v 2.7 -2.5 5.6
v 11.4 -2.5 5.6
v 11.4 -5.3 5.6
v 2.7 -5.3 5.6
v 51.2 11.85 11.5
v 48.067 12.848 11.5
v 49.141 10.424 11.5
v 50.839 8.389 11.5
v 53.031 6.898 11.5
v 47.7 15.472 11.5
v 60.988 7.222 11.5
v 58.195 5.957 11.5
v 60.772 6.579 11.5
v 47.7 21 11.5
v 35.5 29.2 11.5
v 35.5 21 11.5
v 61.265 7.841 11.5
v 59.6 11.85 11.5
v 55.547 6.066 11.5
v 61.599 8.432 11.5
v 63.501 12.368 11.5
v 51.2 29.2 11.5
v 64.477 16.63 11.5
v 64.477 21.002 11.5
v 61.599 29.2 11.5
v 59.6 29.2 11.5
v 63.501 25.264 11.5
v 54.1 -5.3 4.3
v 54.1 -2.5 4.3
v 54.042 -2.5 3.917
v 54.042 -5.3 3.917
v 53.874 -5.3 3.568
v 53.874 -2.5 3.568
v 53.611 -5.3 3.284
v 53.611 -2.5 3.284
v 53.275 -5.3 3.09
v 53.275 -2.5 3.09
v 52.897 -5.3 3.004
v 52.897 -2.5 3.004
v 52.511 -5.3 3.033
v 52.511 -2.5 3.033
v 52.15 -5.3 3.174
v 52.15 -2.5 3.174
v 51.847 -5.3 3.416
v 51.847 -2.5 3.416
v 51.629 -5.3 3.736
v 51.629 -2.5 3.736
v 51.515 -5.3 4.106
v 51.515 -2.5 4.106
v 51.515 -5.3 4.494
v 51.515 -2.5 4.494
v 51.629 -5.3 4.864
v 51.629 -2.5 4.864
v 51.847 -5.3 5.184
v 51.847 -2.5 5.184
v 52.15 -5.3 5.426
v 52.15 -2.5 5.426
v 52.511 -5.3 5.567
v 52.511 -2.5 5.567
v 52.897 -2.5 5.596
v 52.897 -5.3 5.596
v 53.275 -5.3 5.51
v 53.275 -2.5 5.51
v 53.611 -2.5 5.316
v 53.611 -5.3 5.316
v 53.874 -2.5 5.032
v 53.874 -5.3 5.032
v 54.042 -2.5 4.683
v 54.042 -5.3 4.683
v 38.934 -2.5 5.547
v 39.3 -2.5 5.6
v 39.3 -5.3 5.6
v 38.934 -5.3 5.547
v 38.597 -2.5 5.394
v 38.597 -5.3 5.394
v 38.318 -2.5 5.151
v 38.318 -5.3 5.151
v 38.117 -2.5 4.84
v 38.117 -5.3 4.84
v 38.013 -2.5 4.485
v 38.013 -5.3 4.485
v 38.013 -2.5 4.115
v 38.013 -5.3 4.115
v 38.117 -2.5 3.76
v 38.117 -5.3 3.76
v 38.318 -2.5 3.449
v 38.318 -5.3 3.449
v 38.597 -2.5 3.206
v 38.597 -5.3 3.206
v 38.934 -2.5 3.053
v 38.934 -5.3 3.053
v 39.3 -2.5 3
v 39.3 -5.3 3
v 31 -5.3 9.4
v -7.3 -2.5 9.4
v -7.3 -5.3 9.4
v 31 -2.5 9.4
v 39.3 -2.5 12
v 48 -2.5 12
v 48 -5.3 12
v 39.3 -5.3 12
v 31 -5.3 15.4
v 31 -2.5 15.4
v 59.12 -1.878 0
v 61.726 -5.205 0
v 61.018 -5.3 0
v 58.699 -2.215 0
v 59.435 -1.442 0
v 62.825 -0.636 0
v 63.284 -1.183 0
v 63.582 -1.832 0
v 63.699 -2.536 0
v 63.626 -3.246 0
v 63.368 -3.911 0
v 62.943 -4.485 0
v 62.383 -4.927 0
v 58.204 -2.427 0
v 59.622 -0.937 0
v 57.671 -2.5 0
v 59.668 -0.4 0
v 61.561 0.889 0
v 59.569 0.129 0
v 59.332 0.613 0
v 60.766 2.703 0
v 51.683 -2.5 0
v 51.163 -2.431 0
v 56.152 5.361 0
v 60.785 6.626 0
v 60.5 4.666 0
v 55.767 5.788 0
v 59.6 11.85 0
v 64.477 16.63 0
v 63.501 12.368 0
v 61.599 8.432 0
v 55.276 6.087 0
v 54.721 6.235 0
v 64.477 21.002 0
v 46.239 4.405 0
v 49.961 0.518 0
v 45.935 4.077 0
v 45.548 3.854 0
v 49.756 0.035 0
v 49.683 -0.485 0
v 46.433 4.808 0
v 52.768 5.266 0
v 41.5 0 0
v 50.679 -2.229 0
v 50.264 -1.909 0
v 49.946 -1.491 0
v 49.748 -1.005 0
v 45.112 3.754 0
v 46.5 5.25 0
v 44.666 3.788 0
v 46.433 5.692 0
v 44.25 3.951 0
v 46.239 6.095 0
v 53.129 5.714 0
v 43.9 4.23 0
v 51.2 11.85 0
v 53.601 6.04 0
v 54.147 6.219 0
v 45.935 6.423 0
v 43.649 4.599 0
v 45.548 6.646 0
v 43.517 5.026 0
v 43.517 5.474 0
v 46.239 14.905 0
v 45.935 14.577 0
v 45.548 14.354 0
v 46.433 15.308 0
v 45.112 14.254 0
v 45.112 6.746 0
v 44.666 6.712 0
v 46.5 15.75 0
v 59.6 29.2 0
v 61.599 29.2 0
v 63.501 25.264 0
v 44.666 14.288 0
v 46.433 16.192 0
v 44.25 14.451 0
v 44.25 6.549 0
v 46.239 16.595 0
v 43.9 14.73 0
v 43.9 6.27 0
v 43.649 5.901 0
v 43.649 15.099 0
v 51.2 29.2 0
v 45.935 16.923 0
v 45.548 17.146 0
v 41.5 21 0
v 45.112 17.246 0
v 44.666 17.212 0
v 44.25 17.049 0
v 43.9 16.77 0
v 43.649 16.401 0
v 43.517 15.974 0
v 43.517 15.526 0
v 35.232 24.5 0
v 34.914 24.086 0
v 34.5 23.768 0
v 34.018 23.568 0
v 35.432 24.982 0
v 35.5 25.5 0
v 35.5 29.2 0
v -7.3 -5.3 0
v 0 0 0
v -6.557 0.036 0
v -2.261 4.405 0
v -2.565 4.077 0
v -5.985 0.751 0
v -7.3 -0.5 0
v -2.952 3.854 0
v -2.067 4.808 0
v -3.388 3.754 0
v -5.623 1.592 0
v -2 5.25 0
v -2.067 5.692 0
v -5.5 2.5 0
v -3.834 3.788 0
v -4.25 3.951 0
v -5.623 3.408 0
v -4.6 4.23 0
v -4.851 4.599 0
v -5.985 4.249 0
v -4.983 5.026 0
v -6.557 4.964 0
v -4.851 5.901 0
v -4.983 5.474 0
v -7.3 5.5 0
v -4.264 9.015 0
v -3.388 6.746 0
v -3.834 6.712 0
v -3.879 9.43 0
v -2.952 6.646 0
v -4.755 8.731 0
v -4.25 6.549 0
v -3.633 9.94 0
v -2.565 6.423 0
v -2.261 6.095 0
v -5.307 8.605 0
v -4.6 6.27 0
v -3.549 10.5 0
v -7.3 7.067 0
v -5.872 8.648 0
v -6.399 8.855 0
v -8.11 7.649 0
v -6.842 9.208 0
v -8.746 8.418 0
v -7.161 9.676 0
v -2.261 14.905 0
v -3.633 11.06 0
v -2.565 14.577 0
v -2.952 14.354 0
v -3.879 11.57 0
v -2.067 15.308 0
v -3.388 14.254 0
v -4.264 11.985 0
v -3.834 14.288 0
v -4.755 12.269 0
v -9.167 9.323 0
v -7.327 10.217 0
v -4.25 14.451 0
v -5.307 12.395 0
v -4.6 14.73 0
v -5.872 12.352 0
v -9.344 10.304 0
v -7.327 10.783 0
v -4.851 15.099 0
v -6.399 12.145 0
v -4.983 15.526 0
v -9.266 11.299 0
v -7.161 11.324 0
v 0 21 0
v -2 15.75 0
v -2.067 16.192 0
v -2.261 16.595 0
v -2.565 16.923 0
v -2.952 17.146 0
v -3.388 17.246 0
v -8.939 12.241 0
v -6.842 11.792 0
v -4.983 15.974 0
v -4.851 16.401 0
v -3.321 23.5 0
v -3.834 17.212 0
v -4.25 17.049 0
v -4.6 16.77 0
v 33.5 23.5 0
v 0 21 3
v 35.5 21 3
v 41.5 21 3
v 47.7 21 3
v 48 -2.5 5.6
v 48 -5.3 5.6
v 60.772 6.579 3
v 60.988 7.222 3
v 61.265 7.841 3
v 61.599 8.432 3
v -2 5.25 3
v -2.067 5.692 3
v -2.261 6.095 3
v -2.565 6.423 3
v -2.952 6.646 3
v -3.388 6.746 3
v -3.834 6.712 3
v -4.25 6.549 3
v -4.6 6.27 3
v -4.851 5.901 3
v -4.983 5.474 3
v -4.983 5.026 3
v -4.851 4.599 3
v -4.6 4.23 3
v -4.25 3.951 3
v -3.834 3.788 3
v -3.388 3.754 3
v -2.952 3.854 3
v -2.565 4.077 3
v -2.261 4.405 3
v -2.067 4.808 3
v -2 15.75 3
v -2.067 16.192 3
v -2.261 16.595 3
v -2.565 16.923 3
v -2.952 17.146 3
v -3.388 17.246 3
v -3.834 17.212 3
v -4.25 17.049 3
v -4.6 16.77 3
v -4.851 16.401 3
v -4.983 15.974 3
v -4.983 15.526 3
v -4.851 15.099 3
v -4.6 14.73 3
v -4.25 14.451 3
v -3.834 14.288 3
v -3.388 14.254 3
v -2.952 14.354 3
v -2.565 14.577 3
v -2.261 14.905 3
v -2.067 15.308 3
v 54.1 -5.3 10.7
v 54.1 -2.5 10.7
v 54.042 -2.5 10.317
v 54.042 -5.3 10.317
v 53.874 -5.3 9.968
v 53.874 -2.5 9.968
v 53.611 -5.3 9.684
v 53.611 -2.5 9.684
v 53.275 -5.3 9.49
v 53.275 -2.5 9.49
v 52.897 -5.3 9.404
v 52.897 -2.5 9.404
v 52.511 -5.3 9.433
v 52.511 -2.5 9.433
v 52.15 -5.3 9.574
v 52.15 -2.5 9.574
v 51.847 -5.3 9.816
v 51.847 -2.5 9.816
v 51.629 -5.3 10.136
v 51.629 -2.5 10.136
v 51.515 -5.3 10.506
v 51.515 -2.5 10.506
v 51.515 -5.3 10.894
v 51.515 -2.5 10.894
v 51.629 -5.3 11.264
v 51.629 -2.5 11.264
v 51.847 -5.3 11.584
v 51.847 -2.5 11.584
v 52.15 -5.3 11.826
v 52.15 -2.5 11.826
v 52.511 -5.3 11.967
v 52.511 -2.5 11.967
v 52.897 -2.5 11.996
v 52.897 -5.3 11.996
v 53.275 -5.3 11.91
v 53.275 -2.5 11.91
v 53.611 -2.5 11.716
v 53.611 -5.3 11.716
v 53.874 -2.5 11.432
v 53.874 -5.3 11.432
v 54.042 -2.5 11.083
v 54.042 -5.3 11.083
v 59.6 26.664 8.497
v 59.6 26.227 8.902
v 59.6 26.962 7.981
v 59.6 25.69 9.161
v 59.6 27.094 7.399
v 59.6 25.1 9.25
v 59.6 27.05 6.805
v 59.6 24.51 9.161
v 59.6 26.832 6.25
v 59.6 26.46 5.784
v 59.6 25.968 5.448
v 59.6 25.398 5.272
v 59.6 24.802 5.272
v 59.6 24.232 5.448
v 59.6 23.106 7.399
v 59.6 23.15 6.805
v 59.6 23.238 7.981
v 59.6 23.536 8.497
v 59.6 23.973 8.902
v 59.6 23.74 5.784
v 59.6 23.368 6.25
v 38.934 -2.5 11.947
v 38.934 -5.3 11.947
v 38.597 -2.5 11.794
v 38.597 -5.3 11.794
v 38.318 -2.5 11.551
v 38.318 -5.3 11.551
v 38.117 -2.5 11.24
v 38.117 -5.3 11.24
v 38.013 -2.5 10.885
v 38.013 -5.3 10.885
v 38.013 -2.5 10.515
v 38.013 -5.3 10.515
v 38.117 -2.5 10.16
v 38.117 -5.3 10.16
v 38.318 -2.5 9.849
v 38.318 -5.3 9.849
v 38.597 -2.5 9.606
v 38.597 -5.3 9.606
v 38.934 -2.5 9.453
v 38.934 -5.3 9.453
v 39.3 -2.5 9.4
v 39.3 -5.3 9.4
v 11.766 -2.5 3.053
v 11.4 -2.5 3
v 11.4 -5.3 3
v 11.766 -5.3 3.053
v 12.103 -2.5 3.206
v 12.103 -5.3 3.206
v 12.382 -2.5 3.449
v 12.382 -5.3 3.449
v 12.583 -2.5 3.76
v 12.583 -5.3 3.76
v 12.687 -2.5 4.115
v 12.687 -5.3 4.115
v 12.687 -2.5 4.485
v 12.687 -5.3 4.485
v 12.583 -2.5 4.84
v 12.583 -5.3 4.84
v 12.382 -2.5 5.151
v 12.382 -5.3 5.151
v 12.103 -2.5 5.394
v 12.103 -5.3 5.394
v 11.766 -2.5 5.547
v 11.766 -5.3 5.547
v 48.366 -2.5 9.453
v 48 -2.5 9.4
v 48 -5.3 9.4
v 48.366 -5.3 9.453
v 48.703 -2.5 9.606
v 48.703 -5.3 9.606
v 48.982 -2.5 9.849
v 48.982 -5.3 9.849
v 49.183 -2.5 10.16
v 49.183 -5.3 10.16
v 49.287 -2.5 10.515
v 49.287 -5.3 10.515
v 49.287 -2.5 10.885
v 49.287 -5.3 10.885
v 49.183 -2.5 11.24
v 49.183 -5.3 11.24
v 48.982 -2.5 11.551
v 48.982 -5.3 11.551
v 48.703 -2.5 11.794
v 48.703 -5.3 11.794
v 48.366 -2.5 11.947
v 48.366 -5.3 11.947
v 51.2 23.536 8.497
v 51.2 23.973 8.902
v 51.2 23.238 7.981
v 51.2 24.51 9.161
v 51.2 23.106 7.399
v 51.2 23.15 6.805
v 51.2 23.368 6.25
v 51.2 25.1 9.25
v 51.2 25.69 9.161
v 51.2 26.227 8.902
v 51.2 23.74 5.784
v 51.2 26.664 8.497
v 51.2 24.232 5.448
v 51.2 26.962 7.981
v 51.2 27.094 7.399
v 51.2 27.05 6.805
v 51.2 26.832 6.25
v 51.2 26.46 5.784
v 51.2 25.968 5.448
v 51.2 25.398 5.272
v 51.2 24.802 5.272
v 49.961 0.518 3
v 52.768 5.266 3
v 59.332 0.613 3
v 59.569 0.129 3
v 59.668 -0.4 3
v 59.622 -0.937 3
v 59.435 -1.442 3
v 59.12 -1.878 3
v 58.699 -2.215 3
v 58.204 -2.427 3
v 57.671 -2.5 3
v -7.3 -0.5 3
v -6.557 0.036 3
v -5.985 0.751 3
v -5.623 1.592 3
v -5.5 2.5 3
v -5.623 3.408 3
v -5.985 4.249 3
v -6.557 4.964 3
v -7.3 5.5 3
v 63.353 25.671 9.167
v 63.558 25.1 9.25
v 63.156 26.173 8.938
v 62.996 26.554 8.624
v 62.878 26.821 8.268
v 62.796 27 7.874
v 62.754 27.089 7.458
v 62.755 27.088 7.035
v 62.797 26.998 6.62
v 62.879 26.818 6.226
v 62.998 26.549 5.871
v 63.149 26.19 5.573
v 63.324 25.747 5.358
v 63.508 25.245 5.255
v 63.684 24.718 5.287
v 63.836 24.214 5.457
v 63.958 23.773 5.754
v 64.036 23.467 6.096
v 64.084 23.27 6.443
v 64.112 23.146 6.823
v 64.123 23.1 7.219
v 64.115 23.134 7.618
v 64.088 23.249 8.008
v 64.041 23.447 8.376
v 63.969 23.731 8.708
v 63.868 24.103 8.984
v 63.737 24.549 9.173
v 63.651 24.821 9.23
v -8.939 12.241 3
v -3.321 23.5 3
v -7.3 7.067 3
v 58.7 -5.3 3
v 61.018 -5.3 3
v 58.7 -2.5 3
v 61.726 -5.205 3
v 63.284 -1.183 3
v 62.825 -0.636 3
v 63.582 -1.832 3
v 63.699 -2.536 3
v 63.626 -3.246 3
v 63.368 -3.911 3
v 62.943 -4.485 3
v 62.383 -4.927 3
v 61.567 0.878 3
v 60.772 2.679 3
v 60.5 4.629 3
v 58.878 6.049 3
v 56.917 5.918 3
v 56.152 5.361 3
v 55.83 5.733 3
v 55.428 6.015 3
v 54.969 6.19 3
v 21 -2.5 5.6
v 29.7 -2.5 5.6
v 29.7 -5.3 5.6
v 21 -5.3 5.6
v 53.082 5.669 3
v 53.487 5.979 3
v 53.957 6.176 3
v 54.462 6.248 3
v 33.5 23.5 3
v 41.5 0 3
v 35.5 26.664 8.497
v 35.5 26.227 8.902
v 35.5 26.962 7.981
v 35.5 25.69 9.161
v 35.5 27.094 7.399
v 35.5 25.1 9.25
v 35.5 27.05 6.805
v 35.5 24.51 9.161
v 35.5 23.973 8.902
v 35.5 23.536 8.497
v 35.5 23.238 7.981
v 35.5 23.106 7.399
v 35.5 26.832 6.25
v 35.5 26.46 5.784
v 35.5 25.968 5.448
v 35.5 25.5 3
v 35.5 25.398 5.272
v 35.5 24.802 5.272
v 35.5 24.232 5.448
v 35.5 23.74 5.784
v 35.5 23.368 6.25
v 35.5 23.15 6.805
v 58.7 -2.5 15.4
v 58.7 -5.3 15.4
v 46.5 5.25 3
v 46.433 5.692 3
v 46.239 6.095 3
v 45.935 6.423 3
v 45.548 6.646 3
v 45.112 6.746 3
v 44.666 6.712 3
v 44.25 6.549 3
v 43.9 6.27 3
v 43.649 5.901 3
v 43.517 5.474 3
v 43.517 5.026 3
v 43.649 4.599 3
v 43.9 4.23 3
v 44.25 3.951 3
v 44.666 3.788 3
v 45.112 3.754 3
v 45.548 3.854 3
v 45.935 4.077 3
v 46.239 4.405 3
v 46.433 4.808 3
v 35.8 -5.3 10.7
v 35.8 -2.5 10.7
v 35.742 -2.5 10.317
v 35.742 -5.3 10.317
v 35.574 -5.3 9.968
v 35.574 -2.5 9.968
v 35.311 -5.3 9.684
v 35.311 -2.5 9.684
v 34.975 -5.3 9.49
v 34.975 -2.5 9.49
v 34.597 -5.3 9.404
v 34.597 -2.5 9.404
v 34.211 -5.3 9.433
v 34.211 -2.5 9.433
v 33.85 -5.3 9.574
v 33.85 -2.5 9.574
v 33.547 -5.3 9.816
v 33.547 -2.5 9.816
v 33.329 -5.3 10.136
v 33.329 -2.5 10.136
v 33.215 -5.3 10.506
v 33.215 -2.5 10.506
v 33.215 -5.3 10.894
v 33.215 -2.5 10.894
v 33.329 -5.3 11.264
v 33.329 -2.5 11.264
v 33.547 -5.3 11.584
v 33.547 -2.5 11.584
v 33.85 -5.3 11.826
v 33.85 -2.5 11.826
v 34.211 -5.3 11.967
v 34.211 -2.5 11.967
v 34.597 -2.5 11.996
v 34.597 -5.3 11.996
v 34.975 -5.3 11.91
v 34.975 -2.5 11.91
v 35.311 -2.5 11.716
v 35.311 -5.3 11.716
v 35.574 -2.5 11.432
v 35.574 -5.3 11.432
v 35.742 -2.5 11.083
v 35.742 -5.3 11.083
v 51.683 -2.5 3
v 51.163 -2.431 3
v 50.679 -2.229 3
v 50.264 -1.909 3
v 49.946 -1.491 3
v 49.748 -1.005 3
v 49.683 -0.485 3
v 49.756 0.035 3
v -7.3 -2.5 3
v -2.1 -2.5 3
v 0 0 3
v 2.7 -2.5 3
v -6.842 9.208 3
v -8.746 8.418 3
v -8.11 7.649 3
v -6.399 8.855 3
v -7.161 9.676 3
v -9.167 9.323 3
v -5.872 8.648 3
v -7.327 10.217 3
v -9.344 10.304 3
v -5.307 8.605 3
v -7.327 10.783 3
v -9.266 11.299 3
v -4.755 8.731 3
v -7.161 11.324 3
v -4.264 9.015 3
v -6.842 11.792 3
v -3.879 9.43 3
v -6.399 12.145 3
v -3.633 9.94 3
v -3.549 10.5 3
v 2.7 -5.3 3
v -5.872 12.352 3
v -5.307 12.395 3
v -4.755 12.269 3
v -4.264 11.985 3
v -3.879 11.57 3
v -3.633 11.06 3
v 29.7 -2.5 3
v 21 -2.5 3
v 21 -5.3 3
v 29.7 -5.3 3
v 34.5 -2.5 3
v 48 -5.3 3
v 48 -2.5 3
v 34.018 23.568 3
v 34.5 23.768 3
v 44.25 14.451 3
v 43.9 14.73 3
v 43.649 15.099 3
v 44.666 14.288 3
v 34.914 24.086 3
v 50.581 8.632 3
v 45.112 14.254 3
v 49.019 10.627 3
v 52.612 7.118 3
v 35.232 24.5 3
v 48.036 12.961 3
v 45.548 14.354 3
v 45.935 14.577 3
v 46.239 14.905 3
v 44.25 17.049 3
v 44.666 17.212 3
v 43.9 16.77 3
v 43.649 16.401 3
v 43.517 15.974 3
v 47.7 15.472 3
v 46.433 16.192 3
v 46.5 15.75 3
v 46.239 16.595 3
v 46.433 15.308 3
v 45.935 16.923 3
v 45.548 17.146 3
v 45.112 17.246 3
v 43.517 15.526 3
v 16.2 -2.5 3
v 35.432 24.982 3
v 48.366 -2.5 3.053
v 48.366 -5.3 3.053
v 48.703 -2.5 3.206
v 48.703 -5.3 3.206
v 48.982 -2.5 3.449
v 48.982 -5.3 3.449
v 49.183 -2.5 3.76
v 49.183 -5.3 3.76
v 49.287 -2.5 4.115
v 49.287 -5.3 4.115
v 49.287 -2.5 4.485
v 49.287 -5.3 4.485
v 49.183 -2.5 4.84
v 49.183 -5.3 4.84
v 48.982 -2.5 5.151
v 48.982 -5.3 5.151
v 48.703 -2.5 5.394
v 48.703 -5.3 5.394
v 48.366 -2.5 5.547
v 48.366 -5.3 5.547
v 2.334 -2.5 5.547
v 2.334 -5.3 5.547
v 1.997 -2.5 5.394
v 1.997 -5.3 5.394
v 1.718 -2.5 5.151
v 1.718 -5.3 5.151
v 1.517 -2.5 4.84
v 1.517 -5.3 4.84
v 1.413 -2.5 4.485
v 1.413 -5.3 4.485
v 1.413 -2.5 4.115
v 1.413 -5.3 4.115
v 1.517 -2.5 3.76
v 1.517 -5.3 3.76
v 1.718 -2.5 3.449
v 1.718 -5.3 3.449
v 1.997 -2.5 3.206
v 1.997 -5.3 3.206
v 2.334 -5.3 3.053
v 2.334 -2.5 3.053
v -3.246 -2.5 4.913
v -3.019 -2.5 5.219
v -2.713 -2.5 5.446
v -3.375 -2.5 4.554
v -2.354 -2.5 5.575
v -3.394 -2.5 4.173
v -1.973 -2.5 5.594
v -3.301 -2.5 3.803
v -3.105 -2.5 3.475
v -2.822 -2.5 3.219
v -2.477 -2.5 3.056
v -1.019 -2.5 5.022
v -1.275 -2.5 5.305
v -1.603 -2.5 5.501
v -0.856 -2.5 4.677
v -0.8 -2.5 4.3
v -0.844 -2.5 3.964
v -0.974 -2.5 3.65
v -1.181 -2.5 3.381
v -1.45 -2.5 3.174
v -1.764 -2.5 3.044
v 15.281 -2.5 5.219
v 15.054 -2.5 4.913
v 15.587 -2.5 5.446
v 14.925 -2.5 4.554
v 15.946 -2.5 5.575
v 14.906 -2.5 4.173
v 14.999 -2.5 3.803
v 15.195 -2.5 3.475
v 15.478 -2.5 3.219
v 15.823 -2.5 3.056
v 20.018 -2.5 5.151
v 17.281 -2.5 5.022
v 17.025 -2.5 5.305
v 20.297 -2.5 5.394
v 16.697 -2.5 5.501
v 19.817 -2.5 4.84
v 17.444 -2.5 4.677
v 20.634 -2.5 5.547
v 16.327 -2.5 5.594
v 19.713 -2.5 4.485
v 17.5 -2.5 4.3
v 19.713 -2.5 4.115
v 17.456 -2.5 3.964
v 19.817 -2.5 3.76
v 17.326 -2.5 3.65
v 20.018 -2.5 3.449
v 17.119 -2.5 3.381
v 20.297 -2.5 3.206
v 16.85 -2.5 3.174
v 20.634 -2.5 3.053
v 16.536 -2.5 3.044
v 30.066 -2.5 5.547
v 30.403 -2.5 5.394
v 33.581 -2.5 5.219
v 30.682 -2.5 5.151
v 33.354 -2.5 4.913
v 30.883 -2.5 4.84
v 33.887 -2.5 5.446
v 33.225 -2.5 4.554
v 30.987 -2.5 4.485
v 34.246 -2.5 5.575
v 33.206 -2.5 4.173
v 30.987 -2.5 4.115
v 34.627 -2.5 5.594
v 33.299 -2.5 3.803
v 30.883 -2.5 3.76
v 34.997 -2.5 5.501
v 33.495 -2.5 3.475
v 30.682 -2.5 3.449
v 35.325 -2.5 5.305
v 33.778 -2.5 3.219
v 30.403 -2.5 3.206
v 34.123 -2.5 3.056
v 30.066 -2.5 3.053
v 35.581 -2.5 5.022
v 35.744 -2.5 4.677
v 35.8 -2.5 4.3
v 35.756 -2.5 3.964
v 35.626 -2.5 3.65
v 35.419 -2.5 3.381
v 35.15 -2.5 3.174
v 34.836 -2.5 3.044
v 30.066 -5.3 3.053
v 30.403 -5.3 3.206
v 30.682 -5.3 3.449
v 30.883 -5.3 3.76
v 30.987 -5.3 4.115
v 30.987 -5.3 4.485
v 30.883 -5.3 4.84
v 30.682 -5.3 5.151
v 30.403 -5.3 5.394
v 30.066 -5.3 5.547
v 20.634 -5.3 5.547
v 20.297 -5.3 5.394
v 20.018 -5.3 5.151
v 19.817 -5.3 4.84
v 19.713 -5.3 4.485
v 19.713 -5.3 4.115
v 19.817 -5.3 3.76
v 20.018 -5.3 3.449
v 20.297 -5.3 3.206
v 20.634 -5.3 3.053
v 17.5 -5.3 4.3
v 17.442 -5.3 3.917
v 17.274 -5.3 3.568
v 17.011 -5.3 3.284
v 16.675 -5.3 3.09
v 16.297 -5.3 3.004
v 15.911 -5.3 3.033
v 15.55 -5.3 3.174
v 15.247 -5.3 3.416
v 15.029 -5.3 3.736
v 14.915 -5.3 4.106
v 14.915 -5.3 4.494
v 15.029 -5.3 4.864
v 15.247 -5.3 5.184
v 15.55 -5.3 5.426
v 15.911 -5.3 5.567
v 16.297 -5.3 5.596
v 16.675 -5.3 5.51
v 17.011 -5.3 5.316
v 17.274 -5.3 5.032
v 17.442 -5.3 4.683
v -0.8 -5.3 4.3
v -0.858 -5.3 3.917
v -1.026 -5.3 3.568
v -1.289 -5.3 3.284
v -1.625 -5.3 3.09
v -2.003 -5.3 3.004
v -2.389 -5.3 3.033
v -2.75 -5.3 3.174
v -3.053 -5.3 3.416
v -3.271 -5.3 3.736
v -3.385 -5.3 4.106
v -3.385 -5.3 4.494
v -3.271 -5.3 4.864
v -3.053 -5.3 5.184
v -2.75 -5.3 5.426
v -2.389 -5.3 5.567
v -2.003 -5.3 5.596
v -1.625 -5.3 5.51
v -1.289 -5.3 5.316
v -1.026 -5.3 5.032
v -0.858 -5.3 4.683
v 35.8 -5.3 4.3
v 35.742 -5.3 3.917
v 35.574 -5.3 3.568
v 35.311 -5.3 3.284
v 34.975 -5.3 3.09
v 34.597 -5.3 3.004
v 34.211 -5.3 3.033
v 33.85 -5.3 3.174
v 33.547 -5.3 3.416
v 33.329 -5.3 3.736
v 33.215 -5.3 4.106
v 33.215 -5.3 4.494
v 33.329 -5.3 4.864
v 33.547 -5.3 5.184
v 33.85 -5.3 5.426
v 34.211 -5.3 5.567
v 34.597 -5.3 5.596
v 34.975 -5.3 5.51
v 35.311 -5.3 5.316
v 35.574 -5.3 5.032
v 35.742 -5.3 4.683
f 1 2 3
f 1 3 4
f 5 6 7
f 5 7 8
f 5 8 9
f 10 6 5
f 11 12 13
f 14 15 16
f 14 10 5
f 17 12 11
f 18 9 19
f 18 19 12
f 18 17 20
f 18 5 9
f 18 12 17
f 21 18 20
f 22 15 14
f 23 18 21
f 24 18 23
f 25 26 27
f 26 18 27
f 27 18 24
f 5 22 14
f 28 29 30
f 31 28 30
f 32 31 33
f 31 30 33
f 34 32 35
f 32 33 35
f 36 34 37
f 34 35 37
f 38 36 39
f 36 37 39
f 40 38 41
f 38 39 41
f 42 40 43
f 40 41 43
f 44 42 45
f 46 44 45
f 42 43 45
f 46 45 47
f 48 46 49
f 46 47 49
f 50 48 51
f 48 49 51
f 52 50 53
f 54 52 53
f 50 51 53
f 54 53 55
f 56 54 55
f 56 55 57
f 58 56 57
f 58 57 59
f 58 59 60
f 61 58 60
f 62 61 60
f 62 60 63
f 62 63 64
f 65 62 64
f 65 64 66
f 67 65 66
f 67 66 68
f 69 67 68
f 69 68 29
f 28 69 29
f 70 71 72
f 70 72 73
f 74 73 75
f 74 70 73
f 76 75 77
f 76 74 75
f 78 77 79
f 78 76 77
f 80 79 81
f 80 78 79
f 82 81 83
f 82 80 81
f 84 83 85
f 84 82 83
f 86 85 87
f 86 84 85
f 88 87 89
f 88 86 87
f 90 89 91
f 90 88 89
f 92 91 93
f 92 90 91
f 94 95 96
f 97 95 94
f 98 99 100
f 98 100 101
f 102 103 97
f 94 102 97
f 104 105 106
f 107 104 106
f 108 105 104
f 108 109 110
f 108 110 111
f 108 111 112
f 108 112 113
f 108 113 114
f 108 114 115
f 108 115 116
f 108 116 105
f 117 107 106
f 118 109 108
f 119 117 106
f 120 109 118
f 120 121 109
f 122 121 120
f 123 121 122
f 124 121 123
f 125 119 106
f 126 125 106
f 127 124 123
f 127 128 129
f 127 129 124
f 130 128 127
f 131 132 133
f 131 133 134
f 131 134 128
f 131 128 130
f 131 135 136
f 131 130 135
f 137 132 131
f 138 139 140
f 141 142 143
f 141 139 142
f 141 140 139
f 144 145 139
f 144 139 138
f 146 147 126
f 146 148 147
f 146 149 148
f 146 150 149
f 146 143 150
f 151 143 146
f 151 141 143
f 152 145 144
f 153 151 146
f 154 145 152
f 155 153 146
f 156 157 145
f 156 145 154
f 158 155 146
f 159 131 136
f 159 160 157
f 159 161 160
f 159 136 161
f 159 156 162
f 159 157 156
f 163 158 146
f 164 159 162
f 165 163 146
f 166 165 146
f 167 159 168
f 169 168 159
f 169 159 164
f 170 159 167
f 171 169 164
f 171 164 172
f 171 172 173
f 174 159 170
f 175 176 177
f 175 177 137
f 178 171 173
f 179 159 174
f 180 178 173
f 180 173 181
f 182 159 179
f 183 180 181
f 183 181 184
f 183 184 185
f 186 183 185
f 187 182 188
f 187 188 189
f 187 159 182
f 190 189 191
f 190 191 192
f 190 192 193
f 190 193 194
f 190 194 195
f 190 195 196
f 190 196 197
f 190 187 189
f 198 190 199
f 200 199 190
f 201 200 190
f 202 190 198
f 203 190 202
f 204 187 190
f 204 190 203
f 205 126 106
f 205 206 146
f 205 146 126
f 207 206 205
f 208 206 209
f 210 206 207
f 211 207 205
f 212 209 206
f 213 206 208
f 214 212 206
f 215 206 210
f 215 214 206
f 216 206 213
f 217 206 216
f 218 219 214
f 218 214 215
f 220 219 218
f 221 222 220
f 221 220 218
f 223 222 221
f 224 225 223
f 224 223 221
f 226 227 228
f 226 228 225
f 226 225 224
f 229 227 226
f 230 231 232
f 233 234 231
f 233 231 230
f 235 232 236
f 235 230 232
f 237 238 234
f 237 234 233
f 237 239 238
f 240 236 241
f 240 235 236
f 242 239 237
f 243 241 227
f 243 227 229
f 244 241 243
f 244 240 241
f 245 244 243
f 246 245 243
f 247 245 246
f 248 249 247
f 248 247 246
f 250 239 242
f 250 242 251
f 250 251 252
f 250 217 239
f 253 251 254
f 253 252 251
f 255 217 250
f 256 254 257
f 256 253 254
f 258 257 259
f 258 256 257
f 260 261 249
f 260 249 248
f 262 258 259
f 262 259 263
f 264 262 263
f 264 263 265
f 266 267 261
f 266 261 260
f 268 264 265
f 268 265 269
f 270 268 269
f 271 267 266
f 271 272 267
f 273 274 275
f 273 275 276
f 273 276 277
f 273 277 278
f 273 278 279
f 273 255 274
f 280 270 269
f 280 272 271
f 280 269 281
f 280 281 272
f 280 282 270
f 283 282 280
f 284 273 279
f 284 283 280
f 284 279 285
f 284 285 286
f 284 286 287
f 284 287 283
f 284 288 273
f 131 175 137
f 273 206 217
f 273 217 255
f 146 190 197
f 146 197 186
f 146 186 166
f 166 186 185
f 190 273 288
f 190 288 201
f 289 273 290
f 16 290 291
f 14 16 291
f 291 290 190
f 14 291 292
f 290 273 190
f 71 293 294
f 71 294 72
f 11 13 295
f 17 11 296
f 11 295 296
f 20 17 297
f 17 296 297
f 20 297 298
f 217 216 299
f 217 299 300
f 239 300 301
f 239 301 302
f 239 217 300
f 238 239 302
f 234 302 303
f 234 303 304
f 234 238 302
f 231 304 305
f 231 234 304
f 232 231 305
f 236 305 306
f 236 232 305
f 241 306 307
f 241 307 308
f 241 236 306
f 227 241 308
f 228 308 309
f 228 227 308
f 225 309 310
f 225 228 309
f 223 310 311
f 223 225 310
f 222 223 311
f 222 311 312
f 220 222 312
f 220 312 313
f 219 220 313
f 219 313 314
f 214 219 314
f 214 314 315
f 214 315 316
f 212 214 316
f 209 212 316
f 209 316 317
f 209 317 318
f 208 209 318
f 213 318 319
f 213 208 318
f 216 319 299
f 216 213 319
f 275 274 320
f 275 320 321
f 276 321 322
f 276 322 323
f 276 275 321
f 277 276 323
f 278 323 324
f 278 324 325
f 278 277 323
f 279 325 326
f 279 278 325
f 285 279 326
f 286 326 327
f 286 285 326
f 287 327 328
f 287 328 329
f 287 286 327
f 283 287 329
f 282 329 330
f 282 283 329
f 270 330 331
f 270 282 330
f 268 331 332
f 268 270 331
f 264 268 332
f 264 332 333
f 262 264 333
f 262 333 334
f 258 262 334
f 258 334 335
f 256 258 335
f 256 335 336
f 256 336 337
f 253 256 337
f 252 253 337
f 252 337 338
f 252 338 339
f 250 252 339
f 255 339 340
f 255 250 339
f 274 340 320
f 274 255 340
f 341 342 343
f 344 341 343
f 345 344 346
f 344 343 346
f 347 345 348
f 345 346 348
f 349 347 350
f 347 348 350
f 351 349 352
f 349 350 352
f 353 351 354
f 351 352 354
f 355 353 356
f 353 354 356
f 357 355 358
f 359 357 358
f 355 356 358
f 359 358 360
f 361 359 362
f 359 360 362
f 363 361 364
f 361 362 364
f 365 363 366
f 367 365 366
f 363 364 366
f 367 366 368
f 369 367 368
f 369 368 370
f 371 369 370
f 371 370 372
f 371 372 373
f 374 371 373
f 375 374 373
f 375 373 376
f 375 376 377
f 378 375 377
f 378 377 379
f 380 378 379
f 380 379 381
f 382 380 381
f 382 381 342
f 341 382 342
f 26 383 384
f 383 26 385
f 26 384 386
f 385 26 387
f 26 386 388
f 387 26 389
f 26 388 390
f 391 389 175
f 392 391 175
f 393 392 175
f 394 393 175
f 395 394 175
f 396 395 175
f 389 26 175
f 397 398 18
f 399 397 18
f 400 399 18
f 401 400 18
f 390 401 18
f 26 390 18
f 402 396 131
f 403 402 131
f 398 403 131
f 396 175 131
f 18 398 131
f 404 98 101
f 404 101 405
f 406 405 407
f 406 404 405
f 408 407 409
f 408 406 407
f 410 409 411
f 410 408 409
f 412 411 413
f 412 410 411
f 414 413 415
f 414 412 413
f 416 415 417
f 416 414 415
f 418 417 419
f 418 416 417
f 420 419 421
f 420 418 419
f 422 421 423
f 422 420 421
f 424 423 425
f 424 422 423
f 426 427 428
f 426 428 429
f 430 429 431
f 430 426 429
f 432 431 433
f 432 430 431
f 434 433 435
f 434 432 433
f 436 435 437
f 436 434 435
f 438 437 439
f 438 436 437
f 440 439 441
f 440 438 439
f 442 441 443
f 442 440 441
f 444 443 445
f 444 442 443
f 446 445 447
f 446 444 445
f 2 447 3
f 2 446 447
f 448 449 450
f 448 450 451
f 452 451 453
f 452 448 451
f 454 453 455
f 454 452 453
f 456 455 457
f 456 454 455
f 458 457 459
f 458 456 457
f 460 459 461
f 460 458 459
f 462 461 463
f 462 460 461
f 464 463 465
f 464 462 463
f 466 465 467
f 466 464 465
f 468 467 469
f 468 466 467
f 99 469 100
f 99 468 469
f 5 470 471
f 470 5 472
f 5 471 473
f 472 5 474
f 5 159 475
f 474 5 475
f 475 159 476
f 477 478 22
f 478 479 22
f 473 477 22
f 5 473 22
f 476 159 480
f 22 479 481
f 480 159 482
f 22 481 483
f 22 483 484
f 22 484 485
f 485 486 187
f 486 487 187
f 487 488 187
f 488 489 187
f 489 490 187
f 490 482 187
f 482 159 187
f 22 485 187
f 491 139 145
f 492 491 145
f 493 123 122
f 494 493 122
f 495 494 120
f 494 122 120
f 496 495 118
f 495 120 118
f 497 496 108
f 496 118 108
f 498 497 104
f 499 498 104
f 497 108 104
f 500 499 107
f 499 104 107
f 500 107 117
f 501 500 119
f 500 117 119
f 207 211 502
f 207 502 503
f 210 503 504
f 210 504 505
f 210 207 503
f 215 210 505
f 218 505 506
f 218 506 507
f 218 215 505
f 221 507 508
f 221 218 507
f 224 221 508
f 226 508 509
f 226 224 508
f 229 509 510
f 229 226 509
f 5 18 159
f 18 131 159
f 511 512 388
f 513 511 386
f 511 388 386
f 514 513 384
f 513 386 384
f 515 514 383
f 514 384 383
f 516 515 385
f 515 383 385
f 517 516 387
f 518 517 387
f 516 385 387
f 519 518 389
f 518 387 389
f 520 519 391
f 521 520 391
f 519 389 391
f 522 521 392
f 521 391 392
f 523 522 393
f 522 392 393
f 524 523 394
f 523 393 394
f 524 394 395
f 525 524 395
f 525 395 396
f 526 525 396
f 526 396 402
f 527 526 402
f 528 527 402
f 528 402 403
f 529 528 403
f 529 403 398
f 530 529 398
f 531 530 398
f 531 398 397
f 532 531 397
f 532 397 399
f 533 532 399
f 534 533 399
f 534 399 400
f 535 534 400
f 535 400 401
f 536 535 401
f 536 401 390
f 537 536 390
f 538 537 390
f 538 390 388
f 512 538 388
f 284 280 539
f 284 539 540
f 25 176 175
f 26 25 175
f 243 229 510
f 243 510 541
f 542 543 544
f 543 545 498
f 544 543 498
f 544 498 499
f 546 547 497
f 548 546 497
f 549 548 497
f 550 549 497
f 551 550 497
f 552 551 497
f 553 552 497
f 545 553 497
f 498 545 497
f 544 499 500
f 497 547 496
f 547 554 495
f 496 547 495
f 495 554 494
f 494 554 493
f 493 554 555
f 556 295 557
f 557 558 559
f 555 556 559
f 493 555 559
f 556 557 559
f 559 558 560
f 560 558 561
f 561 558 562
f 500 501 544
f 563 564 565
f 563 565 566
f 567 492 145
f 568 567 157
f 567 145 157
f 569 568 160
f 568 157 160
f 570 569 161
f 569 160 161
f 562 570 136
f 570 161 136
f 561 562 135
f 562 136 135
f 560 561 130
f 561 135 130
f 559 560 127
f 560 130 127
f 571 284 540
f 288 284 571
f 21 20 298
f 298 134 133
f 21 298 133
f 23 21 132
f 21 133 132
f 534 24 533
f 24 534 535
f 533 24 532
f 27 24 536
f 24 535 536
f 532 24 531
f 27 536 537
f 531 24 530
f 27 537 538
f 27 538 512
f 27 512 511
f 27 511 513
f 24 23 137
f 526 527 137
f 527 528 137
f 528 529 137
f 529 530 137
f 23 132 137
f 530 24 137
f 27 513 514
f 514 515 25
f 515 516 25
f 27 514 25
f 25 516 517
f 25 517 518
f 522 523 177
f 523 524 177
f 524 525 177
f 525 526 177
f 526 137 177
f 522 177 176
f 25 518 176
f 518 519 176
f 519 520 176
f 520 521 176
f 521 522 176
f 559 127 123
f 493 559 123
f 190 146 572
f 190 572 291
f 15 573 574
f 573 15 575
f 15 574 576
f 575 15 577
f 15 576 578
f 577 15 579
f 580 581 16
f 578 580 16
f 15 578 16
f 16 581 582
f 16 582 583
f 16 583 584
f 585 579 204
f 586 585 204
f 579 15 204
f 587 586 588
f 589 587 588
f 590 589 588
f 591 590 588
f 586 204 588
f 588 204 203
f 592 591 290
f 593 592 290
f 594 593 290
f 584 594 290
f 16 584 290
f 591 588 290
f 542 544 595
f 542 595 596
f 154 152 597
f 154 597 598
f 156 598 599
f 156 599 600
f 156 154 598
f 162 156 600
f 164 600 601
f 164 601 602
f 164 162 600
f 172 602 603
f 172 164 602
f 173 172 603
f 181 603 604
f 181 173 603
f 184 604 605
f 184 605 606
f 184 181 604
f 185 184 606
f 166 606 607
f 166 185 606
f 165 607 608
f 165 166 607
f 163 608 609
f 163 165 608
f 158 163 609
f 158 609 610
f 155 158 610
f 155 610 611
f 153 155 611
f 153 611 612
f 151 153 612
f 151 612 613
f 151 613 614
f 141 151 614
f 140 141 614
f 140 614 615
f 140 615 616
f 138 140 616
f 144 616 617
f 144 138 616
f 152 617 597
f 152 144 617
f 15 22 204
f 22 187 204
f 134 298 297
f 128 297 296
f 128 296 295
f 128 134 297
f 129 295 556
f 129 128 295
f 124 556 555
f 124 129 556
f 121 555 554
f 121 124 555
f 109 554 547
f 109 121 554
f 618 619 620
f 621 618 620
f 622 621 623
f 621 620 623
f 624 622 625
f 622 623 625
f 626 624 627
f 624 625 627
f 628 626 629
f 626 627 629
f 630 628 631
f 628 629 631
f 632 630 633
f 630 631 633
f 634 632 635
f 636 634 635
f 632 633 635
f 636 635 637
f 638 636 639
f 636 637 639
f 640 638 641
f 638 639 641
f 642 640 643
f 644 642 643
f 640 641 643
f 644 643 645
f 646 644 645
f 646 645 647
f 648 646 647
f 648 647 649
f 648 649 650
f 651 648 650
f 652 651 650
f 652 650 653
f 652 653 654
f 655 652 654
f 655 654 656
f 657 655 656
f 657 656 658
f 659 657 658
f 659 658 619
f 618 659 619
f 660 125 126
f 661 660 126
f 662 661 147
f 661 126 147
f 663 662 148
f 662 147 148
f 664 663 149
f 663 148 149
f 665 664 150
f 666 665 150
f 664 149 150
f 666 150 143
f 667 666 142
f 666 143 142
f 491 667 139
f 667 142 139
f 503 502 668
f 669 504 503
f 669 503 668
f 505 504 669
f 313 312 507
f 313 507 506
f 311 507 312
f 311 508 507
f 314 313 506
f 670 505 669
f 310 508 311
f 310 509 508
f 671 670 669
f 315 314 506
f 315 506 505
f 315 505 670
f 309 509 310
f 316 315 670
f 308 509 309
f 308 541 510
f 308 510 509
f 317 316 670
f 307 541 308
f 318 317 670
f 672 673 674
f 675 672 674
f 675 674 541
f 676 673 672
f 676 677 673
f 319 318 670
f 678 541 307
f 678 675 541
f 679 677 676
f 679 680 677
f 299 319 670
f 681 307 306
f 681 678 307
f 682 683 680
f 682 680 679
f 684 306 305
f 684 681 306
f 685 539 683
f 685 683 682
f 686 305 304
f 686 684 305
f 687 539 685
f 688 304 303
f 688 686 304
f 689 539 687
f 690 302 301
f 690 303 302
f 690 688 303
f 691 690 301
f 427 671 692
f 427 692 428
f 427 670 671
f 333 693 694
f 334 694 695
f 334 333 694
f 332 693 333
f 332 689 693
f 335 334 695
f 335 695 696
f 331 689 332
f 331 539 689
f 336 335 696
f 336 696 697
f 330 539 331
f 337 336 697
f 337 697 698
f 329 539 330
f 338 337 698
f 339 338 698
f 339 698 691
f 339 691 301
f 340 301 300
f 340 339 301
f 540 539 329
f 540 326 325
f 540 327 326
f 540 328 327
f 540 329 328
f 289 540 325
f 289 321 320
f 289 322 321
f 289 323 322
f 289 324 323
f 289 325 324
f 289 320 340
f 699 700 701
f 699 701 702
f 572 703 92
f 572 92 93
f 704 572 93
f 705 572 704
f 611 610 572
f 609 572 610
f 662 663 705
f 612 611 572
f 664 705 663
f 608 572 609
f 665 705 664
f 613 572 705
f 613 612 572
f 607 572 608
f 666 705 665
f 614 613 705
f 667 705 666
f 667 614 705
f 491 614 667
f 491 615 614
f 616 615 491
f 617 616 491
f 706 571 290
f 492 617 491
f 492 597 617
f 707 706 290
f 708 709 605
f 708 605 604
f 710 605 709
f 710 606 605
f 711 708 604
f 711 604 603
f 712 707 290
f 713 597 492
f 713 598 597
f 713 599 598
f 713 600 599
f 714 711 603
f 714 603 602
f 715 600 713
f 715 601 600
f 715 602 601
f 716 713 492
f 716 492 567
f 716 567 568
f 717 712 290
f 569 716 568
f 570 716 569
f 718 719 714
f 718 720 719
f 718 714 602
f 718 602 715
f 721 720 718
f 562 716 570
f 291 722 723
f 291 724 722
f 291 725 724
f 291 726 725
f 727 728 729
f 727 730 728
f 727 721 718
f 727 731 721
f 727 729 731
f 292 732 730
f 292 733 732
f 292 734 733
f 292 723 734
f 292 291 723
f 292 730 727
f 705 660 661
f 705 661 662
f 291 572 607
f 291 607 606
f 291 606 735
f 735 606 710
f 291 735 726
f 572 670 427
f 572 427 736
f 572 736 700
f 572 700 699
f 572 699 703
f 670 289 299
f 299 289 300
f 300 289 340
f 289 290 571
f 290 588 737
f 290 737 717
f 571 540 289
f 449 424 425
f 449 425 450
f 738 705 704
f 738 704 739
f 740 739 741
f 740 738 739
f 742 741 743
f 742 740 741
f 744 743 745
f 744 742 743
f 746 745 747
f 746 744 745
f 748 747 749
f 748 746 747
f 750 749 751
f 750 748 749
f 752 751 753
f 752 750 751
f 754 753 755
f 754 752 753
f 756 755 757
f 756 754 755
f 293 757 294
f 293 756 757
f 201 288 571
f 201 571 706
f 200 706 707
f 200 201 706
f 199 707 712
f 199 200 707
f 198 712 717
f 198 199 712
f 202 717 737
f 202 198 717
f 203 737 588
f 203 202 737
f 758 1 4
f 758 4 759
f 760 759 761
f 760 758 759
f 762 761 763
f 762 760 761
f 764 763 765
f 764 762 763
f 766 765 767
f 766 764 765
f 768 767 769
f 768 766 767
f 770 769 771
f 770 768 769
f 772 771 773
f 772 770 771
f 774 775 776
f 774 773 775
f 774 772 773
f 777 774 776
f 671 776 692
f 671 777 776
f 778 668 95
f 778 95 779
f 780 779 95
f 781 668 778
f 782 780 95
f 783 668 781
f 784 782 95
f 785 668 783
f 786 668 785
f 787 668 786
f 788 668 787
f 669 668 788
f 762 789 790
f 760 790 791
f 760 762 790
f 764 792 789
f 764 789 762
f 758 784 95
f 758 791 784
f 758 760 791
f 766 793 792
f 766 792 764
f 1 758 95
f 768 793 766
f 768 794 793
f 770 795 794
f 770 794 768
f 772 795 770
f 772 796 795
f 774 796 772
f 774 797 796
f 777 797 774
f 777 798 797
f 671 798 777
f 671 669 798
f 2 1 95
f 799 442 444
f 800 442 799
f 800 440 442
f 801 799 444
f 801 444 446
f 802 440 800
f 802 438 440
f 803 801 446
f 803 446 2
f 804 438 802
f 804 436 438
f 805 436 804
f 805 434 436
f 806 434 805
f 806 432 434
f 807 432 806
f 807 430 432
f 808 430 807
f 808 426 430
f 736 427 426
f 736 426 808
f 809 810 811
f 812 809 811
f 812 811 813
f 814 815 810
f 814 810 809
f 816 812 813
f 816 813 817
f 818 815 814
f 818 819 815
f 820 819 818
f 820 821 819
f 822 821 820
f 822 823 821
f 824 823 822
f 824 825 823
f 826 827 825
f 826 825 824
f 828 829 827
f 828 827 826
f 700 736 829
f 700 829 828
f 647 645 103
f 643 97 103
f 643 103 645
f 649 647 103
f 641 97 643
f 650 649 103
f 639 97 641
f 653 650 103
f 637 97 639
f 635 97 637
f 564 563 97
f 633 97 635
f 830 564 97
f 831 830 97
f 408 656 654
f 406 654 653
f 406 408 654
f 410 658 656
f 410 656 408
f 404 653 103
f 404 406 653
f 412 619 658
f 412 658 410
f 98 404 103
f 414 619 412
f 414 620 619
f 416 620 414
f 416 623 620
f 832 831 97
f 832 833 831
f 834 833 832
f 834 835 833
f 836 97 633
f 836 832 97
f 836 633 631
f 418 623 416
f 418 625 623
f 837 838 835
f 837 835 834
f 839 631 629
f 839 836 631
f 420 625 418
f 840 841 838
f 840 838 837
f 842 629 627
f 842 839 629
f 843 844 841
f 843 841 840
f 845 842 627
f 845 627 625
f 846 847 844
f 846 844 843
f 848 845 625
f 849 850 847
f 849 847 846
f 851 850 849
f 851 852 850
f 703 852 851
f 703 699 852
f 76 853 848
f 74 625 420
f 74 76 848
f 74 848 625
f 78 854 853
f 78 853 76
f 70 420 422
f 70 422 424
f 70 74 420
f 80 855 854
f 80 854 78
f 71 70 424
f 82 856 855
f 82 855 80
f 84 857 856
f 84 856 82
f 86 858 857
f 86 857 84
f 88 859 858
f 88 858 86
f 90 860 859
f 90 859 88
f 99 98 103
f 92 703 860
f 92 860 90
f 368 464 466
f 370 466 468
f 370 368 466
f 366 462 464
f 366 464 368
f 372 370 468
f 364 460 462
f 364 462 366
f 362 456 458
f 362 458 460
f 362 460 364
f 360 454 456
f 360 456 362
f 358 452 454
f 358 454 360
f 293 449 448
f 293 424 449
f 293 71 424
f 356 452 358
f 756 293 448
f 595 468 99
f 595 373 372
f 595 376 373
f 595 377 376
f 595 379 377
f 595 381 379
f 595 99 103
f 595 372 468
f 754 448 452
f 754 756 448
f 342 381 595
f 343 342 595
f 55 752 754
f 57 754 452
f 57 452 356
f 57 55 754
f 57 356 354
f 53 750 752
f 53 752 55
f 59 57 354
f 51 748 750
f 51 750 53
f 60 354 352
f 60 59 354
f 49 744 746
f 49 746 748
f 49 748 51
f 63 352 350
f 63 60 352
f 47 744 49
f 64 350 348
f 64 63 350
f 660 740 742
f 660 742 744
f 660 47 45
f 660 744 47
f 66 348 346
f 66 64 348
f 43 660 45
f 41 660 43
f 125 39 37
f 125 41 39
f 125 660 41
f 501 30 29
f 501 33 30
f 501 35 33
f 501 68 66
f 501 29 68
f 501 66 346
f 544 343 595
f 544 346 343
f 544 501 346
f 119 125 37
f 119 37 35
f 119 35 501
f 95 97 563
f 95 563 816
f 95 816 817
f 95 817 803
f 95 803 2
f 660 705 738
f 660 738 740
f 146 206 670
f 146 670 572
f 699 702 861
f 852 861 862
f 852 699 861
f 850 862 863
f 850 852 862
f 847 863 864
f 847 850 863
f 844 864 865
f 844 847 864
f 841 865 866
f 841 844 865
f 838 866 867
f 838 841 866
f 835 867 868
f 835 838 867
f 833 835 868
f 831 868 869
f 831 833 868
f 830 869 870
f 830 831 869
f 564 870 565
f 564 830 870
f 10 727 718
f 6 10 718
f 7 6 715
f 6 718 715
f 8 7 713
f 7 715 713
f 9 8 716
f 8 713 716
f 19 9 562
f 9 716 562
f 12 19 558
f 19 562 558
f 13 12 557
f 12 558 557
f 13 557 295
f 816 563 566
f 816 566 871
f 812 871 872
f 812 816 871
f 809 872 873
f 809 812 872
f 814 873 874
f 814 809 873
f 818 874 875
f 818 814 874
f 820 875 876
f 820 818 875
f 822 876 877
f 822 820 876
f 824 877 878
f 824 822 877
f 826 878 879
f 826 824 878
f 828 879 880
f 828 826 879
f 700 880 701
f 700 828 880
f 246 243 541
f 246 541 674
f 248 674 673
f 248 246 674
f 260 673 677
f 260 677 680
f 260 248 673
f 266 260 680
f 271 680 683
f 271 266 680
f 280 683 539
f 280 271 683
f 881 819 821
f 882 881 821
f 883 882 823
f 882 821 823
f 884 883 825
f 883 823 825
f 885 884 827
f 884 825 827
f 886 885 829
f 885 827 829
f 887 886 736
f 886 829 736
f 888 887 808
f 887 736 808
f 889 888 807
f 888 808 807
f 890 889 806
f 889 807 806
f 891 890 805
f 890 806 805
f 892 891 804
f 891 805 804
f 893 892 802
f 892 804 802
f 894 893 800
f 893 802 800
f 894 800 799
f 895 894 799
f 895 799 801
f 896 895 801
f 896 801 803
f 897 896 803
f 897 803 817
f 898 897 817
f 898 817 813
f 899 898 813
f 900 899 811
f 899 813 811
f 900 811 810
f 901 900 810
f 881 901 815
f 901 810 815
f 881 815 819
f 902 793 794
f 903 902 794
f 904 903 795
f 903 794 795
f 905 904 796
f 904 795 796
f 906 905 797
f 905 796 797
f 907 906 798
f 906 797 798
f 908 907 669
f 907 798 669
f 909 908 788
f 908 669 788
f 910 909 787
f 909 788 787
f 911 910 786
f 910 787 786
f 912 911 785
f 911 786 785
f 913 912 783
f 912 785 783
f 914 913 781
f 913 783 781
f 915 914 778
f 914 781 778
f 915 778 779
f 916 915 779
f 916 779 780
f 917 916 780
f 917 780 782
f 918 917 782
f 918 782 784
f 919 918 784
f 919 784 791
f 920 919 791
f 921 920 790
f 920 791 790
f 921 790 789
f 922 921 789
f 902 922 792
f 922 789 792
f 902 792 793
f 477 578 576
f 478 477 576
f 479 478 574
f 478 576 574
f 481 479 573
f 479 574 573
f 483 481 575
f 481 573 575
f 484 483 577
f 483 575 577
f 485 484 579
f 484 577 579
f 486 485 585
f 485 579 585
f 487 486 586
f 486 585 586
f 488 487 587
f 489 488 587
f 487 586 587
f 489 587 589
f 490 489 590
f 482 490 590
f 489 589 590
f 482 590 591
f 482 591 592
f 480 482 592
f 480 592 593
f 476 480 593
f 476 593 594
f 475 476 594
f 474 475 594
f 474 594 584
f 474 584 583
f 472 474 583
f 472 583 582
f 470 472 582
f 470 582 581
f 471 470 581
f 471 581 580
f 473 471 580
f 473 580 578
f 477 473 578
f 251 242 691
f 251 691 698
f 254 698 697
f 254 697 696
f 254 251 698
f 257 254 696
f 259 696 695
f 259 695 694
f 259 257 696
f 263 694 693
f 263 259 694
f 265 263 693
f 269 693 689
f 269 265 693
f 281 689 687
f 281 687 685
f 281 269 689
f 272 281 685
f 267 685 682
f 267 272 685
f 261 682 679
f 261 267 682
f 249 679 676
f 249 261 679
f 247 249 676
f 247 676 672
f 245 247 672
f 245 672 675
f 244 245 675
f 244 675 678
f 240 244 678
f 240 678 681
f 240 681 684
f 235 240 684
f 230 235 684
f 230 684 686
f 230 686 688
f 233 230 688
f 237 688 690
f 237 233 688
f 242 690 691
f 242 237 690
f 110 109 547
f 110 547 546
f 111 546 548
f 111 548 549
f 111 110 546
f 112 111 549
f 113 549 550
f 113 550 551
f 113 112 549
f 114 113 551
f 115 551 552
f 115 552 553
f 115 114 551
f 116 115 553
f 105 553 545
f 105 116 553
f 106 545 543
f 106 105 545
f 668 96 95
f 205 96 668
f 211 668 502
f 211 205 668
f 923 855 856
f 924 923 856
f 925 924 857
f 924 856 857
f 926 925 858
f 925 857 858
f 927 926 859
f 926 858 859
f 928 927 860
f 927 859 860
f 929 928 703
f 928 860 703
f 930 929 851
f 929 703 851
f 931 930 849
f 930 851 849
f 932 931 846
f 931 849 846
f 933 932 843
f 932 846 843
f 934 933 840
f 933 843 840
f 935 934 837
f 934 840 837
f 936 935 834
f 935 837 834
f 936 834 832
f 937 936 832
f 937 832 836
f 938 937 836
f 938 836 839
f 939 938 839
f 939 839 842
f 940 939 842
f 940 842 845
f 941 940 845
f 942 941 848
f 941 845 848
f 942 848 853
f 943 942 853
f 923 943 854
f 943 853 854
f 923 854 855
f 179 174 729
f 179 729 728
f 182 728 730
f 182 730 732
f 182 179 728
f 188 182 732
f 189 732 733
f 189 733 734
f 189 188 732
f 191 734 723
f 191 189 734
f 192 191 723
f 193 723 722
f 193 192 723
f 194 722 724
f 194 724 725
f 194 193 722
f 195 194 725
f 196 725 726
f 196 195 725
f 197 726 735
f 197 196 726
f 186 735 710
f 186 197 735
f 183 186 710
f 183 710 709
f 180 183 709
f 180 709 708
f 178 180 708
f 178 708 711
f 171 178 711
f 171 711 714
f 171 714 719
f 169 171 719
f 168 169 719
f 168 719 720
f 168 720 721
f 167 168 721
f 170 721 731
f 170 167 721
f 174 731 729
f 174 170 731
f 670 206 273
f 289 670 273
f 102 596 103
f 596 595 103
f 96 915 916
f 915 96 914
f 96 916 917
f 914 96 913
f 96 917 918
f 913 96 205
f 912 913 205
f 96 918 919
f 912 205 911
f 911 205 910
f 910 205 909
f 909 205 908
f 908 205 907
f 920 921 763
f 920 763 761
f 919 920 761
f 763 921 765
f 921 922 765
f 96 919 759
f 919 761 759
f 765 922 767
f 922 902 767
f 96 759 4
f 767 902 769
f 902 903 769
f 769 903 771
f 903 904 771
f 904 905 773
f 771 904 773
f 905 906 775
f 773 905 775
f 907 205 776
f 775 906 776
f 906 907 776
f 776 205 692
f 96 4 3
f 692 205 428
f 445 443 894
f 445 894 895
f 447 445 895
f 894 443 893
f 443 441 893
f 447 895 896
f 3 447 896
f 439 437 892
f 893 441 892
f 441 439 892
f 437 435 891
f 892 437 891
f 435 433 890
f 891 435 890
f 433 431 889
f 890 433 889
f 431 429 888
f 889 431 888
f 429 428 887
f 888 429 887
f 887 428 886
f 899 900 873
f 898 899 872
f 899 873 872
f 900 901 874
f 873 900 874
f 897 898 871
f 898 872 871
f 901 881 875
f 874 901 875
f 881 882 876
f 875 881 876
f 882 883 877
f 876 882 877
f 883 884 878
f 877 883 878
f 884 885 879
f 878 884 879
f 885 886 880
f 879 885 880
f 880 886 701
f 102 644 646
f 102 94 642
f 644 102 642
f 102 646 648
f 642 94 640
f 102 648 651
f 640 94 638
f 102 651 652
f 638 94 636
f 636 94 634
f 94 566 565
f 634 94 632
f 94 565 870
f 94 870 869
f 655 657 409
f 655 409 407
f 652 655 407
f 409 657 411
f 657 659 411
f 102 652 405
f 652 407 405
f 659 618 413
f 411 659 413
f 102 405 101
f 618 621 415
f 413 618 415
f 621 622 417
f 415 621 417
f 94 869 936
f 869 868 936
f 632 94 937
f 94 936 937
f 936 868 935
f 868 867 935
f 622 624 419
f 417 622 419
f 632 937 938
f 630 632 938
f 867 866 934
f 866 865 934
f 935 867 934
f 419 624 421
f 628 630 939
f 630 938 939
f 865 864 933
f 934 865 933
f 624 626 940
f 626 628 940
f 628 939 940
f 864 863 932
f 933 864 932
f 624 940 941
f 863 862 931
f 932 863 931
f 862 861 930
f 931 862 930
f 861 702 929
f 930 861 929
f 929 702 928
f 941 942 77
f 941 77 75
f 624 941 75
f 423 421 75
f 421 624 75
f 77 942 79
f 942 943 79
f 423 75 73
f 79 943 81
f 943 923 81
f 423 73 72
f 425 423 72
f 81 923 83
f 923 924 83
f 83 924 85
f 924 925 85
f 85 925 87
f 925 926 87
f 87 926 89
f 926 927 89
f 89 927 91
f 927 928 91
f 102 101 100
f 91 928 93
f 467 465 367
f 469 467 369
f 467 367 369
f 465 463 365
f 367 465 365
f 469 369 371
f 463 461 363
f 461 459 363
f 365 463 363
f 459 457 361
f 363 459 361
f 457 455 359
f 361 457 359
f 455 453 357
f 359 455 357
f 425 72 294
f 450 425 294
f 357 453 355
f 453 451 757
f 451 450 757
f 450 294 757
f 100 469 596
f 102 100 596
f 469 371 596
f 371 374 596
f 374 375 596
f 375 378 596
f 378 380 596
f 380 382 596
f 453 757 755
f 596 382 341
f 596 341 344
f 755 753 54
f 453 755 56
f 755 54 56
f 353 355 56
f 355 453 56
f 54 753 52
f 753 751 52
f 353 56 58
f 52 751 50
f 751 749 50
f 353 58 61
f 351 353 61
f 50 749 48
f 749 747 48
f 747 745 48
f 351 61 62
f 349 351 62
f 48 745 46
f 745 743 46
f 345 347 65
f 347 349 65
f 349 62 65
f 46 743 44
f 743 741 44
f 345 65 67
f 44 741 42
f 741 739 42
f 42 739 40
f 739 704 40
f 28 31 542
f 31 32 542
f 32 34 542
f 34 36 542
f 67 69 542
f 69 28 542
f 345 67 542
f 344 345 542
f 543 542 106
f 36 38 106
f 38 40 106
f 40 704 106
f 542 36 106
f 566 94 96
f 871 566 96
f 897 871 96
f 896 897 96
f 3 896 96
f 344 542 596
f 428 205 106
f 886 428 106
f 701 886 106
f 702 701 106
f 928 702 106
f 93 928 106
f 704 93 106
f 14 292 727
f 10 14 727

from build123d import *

# Parameters (mm, degrees)
SKETCH1_R           = 1.5
SKETCH1_R_2         = 1.9
SKETCH1_W           = 41.5
SKETCH1_H           = 21
BOSS_EXTRUDE1_DEPTH = 3
BOSS_EXTRUDE2_DEPTH = 8.5
BOSS_EXTRUDE3_DEPTH = 12.4
SKETCH4_R           = 1.3
CUT_EXTRUDE1_DEPTH  = 12.4
SKETCH5_W           = 38.3
SKETCH5_H           = 6
CUT_EXTRUDE2_DEPTH  = 12.4
SKETCH6_R           = 2
CUT_EXTRUDE3_DEPTH  = 42.4


with BuildPart() as part:
    # Sketch1 → Boss-Extrude1 (new body)
    with BuildSketch(Plane.XY):
        with BuildLine():
            Line((-3.321392505, 23.5), (33.5, 23.5))
            ThreePointArc((33.5, 23.5), (34.914213562, 24.085786438), (35.5, 25.5))
            Line((35.5, 25.5), (35.5, 29.2))
            Line((35.5, 29.2), (51.2, 29.2))
            Line((51.2, 29.2), (51.2, 11.85))
            Line((51.2, 11.85), (59.6, 11.85))
            Line((59.6, 11.85), (59.6, 29.2))
            Line((59.6, 29.2), (61.598774259, 29.2))
            ThreePointArc((61.598774259, 29.2), (64.6, 18.815792472), (61.598774259, 8.431584945))
            ThreePointArc((61.598774259, 8.431584945), (60.564280065, 3.6748318), (62.825022394, -0.636307591))
            ThreePointArc((62.825022394, -0.636307591), (63.518866569, -3.587010054), (61.018120639, -5.3))
            Line((61.018120639, -5.3), (-7.3, -5.3))
            Line((-7.3, -5.3), (-7.3, -0.5))
            ThreePointArc((-7.3, -0.5), (-5.5, 2.5), (-7.3, 5.5))
            Line((-7.3, 5.5), (-7.3, 7.067398479))
            ThreePointArc((-7.3, 7.067398479), (-9.16671437, 9.322502878), (-8.93851269, 12.241071429))
            Line((-8.93851269, 12.241071429), (-3.321392505, 23.5))
        make_face()
        with Locations((-3.5, 15.75)):
            Circle(SKETCH1_R, mode=Mode.SUBTRACT)
        with Locations((-5.448717527, 10.5)):
            Circle(SKETCH1_R_2, mode=Mode.SUBTRACT)
        with Locations((-3.5, 5.25)):
            Circle(SKETCH1_R, mode=Mode.SUBTRACT)
        with Locations((45, 5.25)):
            Circle(SKETCH1_R, mode=Mode.SUBTRACT)
        with Locations((45, 15.75)):
            Circle(SKETCH1_R, mode=Mode.SUBTRACT)
        with Locations((20.75, 10.5)):
            Rectangle(SKETCH1_W, SKETCH1_H, mode=Mode.SUBTRACT)
        with BuildLine():
            Line((49.961498231, 0.517681209), (52.768212791, 5.266104179))
            ThreePointArc((52.768212791, 5.266104179), (54.433574671, 6.247628711), (56.151588007, 5.361484945))
            Line((56.151588007, 5.361484945), (59.33232839, 0.613061975))
            ThreePointArc((59.33232839, 0.613061975), (59.435061822, -1.441773872), (57.670674684, -2.5))
            Line((57.670674684, -2.5), (51.683219741, -2.5))
            ThreePointArc((51.683219741, -2.5), (49.946072306, -1.491119968), (49.961498231, 0.517681209))
        make_face(mode=Mode.SUBTRACT)
    extrude(amount=BOSS_EXTRUDE1_DEPTH)

    # Sketch2 → Boss-Extrude2 (add)
    with BuildSketch(Plane.XY.offset(3)):
        with BuildLine():
            Line((61.598774259, 29.2), (59.6, 29.2))
            Line((59.6, 29.2), (59.6, 11.85))
            Line((59.6, 11.85), (51.2, 11.85))
            Line((51.2, 11.85), (51.2, 29.2))
            Line((51.2, 29.2), (35.5, 29.2))
            Line((35.5, 29.2), (35.5, 21))
            Line((35.5, 21), (47.7, 21))
            Line((47.7, 21), (47.7, 15.472440326))
            ThreePointArc((47.7, 15.472440326), (51.882998061, 7.567370729), (60.771830096, 6.579310435))
            ThreePointArc((60.771830096, 6.579310435), (61.119060066, 7.535021345), (61.598774259, 8.431584945))
            ThreePointArc((61.598774259, 8.431584945), (64.6, 18.815792472), (61.598774259, 29.2))
        make_face()
    extrude(amount=BOSS_EXTRUDE2_DEPTH)

    # Sketch3 → Boss-Extrude3 (add)
    with BuildSketch(Plane.XY.offset(3)):
        Polygon((46.39680607, -5.3), (-7.3, -5.3), (-7.3, -2.5), (58.7, -2.5), (58.7, -5.3), align=None)
    extrude(amount=BOSS_EXTRUDE3_DEPTH)

    # Sketch4 → Cut-Extrude1 (cut)
    with BuildSketch(Plane(origin=(0, -2.5, 0), x_dir=(1, 0, 0), z_dir=(0, 1, 0))):
        with Locations((52.8, -4.3)):
            Circle(SKETCH4_R)
        with Locations((34.5, -4.3)):
            Circle(SKETCH4_R)
        with Locations((52.8, -10.7)):
            Circle(SKETCH4_R)
        with Locations((34.5, -10.7)):
            Circle(SKETCH4_R)
        with Locations((16.2, -10.7)):
            Circle(SKETCH4_R)
        with Locations((-2.1, -10.7)):
            Circle(SKETCH4_R)
        with Locations((16.2, -4.3)):
            Circle(SKETCH4_R)
        with Locations((-2.1, -4.3)):
            Circle(SKETCH4_R)
        with BuildLine():
            Line((48, -5.6), (39.3, -5.6))
            ThreePointArc((39.3, -5.6), (38, -4.3), (39.3, -3))
            Line((39.3, -3), (48, -3))
            ThreePointArc((48, -3), (49.3, -4.3), (48, -5.6))
        make_face()
        with BuildLine():
            Line((48, -12), (39.3, -12))
            ThreePointArc((39.3, -12), (38, -10.7), (39.3, -9.4))
            Line((39.3, -9.4), (48, -9.4))
            ThreePointArc((48, -9.4), (49.3, -10.7), (48, -12))
        make_face()
        with BuildLine():
            Line((29.7, -12), (21, -12))
            ThreePointArc((21, -12), (19.7, -10.7), (21, -9.4))
            Line((21, -9.4), (29.7, -9.4))
            ThreePointArc((29.7, -9.4), (31, -10.7), (29.7, -12))
        make_face()
        with BuildLine():
            Line((11.4, -12), (2.7, -12))
            ThreePointArc((2.7, -12), (1.4, -10.7), (2.7, -9.4))
            Line((2.7, -9.4), (11.4, -9.4))
            ThreePointArc((11.4, -9.4), (12.7, -10.7), (11.4, -12))
        make_face()
        with BuildLine():
            Line((29.7, -5.6), (21, -5.6))
            ThreePointArc((21, -5.6), (19.7, -4.3), (21, -3))
            Line((21, -3), (29.7, -3))
            ThreePointArc((29.7, -3), (31, -4.3), (29.7, -5.6))
        make_face()
        with BuildLine():
            Line((11.4, -5.6), (2.7, -5.6))
            ThreePointArc((2.7, -5.6), (1.4, -4.3), (2.7, -3))
            Line((2.7, -3), (11.4, -3))
            ThreePointArc((11.4, -3), (12.7, -4.3), (11.4, -5.6))
        make_face()
    extrude(amount=-CUT_EXTRUDE1_DEPTH, mode=Mode.SUBTRACT)

    # Sketch5 → Cut-Extrude2 (cut)
    with BuildSketch(Plane(origin=(0, -2.5, 0), x_dir=(1, 0, 0), z_dir=(0, 1, 0))):
        with Locations((11.85, -12.4)):
            Rectangle(SKETCH5_W, SKETCH5_H)
    extrude(amount=-CUT_EXTRUDE2_DEPTH, mode=Mode.SUBTRACT)

    # Sketch6 → Cut-Extrude3 (cut)
    with BuildSketch(Plane.ZY.offset(-35.5)):
        with Locations((7.25, 25.1)):
            Circle(SKETCH6_R)
    extrude(amount=-CUT_EXTRUDE3_DEPTH, mode=Mode.SUBTRACT)


solid = part.part
